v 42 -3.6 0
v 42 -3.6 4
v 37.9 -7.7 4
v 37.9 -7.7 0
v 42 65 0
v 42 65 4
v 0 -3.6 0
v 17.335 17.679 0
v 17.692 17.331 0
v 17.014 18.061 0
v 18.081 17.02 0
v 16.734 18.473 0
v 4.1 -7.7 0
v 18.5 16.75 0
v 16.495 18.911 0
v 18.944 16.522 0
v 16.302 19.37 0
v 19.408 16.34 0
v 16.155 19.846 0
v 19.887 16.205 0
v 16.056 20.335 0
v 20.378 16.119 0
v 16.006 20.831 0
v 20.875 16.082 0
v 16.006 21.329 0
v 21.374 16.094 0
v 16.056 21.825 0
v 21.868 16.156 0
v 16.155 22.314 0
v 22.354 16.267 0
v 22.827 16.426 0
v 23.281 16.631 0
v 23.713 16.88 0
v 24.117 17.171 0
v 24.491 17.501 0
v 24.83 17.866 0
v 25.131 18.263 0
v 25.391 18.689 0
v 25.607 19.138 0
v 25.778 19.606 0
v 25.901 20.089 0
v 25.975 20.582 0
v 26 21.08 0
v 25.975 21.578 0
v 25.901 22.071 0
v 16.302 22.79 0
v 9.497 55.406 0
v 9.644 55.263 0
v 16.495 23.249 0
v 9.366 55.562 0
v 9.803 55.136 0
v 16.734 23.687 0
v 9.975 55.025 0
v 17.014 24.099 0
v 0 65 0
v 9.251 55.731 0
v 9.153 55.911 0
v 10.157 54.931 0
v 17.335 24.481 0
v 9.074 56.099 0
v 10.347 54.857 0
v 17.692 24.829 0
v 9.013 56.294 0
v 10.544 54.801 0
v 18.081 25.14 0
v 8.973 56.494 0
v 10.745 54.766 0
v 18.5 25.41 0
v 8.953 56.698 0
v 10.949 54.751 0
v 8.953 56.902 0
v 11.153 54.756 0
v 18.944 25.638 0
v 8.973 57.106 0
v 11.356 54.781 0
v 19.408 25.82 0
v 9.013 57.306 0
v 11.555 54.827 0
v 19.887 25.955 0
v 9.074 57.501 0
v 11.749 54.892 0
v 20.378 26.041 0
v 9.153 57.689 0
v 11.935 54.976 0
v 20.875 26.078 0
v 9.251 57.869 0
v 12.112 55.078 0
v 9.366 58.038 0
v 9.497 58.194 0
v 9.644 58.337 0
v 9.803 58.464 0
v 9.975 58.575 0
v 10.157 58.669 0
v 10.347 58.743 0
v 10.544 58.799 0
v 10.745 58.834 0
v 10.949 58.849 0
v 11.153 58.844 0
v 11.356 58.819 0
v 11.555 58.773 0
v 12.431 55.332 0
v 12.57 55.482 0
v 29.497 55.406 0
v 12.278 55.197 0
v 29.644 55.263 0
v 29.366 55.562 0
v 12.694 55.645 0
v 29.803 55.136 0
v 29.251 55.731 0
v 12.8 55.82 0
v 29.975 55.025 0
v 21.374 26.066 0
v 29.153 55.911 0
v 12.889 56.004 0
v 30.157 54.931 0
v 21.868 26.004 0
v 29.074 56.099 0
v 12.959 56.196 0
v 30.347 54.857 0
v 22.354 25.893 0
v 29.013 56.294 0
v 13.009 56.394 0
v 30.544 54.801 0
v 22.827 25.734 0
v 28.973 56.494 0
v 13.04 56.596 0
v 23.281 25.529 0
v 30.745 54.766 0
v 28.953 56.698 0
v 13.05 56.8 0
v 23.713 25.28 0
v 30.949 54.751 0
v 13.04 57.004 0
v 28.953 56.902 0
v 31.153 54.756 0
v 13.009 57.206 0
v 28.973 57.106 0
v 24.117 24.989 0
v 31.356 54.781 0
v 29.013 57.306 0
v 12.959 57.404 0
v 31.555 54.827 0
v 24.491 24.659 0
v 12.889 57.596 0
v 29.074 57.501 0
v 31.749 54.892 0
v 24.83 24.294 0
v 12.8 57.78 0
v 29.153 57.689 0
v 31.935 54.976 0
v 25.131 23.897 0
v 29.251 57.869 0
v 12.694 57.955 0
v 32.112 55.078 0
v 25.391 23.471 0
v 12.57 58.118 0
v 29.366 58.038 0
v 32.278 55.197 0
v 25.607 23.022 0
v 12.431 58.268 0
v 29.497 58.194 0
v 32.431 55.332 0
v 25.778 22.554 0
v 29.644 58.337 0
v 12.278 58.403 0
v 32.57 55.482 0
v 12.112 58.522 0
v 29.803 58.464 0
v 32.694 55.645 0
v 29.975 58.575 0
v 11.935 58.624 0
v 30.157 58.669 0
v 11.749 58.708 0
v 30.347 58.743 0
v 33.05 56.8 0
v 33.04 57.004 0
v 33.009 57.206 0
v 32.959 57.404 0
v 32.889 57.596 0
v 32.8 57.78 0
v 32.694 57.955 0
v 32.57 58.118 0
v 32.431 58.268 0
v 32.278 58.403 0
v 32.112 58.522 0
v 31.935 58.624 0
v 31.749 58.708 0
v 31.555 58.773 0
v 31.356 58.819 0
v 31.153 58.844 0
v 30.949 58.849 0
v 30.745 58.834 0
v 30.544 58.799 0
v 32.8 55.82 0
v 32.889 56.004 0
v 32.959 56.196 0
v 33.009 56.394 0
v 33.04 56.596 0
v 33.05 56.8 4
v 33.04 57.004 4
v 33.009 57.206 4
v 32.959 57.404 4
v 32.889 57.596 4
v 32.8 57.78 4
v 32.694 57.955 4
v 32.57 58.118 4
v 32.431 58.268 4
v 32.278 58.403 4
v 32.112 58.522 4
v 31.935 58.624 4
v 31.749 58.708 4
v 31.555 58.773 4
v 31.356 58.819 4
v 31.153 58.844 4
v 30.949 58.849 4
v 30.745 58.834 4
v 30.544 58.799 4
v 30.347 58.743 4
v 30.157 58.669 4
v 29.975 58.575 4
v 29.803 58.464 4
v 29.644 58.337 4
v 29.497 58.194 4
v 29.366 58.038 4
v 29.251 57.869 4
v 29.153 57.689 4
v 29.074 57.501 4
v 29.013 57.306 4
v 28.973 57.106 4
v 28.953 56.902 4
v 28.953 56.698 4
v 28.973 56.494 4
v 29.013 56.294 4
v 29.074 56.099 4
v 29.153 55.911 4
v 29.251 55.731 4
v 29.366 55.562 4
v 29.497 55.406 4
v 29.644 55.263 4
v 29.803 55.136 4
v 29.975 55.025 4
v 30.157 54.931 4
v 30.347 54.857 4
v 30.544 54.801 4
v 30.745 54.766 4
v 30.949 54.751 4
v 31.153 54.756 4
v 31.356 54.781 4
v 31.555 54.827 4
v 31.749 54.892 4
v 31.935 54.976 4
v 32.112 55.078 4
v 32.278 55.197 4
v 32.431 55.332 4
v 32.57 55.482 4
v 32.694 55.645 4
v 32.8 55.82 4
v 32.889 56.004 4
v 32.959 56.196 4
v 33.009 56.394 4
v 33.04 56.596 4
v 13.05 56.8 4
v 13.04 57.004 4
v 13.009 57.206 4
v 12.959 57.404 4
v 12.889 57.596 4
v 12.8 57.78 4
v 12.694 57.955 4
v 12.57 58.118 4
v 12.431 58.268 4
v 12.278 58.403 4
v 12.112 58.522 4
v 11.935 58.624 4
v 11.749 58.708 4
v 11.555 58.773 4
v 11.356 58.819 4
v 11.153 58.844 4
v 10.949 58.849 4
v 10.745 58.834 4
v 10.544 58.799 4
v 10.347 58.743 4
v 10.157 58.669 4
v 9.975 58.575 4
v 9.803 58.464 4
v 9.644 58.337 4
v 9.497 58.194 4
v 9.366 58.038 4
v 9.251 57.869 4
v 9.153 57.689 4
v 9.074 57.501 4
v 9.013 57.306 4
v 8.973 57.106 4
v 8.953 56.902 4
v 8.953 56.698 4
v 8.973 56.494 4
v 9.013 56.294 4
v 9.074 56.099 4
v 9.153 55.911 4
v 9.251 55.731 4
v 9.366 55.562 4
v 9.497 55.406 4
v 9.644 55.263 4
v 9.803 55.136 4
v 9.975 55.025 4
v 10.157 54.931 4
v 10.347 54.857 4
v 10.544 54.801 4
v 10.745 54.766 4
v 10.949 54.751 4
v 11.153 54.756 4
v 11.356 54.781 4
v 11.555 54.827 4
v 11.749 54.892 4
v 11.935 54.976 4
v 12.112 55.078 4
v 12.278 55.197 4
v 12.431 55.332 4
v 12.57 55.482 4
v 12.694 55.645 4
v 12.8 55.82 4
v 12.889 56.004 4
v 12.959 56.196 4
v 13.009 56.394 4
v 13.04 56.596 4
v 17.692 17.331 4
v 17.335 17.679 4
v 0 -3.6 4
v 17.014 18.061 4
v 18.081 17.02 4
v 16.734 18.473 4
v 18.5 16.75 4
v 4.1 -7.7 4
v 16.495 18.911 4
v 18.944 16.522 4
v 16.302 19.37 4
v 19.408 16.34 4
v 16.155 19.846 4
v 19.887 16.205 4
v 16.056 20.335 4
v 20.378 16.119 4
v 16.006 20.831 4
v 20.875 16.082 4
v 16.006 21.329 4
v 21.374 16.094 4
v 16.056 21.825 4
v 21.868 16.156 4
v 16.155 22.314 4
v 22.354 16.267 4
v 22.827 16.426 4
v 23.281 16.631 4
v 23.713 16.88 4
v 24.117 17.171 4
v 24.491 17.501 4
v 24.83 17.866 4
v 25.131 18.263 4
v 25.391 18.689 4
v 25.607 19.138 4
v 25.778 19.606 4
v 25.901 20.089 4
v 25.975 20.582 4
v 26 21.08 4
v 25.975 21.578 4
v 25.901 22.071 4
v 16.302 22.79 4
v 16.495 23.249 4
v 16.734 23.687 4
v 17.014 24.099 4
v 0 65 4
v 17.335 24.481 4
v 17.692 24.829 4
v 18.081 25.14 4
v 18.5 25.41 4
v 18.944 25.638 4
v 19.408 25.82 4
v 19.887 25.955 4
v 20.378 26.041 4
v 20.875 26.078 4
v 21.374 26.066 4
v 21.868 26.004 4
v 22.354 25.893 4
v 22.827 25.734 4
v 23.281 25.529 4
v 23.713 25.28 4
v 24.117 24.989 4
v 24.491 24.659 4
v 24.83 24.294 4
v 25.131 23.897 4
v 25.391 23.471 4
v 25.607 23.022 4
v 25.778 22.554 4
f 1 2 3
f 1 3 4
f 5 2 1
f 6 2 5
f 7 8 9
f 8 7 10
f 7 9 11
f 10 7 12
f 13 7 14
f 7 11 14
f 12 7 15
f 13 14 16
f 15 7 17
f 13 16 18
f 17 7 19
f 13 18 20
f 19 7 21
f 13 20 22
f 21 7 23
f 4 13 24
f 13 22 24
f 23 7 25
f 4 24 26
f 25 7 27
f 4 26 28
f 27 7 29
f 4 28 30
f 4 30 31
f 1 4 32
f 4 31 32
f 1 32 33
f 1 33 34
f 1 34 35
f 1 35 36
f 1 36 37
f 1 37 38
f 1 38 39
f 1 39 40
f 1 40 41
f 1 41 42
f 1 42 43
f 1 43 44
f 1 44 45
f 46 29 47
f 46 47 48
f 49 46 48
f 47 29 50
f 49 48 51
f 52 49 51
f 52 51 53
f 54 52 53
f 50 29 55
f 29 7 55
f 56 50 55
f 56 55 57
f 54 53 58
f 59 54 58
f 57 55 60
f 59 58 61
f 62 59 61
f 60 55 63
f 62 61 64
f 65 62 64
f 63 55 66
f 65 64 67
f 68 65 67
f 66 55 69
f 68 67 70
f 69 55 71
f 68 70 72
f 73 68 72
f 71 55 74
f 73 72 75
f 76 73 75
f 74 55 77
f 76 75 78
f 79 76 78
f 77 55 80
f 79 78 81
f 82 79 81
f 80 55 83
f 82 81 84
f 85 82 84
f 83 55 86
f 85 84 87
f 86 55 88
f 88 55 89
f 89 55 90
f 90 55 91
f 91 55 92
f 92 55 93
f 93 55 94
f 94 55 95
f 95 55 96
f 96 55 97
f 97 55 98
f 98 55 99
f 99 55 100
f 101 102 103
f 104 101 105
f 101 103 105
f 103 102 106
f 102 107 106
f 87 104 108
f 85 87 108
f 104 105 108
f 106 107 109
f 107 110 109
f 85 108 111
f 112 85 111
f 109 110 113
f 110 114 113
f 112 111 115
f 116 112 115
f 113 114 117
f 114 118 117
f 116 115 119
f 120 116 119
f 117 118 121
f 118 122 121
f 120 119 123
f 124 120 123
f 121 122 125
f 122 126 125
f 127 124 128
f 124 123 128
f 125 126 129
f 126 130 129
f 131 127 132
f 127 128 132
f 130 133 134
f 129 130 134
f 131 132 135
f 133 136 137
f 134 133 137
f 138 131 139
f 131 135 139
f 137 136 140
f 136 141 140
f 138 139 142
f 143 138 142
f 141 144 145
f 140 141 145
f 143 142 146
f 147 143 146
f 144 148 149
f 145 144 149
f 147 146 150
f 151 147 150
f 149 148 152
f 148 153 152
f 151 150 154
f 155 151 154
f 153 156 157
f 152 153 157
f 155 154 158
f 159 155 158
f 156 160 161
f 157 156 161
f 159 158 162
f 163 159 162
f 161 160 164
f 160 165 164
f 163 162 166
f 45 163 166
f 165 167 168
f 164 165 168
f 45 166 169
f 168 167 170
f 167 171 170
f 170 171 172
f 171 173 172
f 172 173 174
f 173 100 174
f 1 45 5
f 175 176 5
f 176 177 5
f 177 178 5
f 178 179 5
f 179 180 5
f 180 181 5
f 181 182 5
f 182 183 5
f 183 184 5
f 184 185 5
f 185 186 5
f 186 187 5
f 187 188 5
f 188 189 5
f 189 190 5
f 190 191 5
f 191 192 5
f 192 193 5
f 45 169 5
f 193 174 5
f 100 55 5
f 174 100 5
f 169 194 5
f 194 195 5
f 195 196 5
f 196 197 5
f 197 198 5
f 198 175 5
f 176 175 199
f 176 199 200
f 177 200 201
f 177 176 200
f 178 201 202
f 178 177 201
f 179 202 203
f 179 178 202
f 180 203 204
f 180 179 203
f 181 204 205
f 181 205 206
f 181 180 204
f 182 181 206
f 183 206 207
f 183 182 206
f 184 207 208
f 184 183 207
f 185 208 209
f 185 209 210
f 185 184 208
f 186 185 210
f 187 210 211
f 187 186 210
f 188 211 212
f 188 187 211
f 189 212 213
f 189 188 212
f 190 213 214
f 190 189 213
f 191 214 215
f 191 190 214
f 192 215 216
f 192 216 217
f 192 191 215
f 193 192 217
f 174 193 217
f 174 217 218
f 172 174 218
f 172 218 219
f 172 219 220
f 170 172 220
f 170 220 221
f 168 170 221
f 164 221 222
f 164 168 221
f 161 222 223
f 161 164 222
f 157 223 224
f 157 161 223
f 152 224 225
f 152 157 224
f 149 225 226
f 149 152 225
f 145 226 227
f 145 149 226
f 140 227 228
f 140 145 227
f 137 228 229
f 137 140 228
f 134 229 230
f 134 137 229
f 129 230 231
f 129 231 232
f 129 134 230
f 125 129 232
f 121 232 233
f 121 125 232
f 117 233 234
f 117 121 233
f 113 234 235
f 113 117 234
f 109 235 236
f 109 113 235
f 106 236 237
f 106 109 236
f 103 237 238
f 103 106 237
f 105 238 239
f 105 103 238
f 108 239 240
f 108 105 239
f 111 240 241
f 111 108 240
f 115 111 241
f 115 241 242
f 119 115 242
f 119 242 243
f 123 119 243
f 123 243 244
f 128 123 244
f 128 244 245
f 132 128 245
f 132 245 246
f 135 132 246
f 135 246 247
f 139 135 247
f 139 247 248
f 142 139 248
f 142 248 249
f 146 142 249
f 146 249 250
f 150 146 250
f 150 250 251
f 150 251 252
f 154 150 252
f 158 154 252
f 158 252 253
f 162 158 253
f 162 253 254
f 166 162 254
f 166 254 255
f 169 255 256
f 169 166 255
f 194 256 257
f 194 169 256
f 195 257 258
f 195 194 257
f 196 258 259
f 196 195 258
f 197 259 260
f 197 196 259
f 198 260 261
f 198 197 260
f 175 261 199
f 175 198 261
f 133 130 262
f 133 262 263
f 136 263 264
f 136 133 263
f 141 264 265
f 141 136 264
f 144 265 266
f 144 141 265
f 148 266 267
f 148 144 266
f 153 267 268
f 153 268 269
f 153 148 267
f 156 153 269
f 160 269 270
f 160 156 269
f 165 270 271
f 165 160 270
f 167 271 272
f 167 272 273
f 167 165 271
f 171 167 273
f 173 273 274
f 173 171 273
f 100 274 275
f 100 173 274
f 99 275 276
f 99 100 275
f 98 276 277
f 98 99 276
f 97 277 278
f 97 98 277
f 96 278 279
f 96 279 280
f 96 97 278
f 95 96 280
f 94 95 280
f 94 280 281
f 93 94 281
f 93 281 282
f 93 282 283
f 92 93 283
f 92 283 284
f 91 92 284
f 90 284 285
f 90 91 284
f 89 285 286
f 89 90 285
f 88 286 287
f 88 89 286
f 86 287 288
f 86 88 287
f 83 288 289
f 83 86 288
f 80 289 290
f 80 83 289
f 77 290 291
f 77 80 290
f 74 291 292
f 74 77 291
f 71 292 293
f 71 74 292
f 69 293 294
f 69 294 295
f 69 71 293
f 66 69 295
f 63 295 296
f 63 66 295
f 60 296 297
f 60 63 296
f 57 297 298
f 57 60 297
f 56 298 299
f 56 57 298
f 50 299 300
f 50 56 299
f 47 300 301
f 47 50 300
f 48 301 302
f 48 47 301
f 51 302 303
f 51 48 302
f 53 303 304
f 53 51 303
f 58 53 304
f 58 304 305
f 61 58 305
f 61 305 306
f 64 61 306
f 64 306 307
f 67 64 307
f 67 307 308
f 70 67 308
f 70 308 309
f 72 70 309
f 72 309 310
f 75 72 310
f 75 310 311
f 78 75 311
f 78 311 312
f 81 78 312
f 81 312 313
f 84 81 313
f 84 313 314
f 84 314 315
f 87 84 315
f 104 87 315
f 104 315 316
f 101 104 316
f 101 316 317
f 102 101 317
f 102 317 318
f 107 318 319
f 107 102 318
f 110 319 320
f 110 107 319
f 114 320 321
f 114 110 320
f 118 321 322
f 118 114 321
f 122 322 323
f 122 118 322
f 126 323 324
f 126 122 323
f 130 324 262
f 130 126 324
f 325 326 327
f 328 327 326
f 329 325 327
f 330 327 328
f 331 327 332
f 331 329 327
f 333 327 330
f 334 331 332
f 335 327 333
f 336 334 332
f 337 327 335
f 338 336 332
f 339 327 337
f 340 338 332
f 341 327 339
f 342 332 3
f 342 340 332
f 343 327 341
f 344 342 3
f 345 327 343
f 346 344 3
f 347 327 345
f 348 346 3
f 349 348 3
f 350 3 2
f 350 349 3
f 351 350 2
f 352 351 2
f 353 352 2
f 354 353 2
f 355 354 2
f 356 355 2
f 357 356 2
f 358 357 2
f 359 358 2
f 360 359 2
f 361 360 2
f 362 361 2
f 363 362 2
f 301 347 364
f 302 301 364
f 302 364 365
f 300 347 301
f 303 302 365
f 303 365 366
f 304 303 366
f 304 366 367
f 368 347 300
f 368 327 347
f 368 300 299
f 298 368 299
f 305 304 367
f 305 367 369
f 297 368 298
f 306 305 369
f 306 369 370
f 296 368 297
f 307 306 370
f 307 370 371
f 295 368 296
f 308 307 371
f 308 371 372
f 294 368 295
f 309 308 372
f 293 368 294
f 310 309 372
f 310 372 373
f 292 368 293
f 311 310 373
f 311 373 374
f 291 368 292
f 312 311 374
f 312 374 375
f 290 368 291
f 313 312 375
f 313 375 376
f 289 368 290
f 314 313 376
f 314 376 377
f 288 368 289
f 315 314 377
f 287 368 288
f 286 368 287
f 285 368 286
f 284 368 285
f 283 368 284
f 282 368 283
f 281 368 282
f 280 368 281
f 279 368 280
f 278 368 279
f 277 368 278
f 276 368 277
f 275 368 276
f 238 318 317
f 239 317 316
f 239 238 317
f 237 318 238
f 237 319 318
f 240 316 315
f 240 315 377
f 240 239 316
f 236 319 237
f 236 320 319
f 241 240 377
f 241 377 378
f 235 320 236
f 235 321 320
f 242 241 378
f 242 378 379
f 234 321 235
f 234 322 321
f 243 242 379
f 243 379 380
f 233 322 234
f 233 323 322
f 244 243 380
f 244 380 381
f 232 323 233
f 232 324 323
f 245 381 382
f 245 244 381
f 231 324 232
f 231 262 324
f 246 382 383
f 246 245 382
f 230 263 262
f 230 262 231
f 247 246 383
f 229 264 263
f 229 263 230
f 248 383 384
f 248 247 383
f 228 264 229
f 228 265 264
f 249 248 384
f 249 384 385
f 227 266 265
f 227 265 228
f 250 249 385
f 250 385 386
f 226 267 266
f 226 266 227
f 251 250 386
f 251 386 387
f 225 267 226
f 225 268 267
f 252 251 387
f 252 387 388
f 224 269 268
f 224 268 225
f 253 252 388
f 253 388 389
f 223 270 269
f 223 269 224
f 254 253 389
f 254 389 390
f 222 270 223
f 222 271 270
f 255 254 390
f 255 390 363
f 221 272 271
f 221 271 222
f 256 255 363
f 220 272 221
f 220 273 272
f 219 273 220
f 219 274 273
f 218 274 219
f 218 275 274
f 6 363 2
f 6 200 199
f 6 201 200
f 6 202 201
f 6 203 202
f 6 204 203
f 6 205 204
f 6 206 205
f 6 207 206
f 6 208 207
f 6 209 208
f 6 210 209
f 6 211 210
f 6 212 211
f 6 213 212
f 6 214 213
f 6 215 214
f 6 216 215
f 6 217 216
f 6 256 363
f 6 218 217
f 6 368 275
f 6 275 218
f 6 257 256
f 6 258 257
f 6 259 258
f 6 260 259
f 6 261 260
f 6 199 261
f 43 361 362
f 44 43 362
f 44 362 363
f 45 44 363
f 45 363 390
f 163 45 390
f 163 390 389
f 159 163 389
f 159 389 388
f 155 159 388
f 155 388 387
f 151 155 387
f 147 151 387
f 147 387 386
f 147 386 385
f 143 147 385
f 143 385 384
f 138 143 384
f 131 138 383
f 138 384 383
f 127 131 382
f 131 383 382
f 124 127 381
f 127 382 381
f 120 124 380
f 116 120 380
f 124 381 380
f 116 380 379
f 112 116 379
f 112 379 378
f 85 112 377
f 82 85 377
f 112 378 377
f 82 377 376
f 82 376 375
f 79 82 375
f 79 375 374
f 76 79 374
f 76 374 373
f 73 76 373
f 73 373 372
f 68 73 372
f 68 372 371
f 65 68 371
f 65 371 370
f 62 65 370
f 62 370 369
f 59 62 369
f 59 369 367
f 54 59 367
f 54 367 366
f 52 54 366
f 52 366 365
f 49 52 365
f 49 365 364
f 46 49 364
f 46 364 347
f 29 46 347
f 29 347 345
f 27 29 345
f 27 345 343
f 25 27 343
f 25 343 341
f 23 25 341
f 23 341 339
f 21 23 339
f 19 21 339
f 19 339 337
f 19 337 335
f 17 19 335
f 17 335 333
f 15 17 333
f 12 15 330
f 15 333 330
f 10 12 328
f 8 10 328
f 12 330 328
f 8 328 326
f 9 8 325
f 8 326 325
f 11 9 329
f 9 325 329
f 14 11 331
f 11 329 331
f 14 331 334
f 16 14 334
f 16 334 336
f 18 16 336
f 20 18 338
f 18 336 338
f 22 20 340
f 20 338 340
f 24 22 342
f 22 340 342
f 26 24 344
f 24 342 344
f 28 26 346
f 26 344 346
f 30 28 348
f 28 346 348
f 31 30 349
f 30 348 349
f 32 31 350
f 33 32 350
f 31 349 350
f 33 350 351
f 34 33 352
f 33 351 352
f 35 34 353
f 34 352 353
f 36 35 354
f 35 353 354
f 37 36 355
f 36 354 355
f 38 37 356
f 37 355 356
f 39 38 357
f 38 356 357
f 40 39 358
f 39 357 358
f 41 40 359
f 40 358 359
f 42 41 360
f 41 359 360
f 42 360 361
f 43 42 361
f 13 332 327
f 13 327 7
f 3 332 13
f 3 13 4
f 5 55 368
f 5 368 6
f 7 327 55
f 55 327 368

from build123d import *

# Parameters (mm, degrees)
CROQUIS1_W              = 42
CROQUIS1_H              = 65
CROQUIS1_R              = 2.05
SALIENTE_EXTRUIR1_DEPTH = 4
CROQUIS5_R              = 5
CORTAR_EXTRUIR2_DEPTH   = 5
CROQUIS6_W              = 42
CROQUIS6_H              = 7.7
SALIENTE_EXTRUIR2_DEPTH = 4
CHAFL_N1_SIZE           = 4.1


with BuildPart() as part:
    # Croquis1 → Saliente-Extruir1 (new body)
    with BuildSketch(Plane.XY):
        with Locations((21, 32.5)):
            Rectangle(CROQUIS1_W, CROQUIS1_H)
        with Locations((11, 56.8)):
            Circle(CROQUIS1_R, mode=Mode.SUBTRACT)
        with Locations((31, 56.8)):
            Circle(CROQUIS1_R, mode=Mode.SUBTRACT)
    extrude(amount=SALIENTE_EXTRUIR1_DEPTH)

    # Croquis5 → Cortar-Extruir2 (cut, through all)
    with BuildSketch(Plane.XY.offset(4)):
        with Locations((21, 21.08)):
            Circle(CROQUIS5_R)
    extrude(amount=-CORTAR_EXTRUIR2_DEPTH, mode=Mode.SUBTRACT)

    # Croquis6 → Saliente-Extruir2 (add, through all)
    with BuildSketch(Plane.XY.offset(4)):
        with Locations((21, -3.85)):
            Rectangle(CROQUIS6_W, CROQUIS6_H)
    extrude(amount=-SALIENTE_EXTRUIR2_DEPTH)

    # Chaflán1
    chafl_n1_edges = [part.edges().sort_by_distance(p)[0] for p in [
        (0, -7.7, 2),
        (42, -7.7, 2),
    ]]
    chamfer(chafl_n1_edges, length=CHAFL_N1_SIZE)


solid = part.part
